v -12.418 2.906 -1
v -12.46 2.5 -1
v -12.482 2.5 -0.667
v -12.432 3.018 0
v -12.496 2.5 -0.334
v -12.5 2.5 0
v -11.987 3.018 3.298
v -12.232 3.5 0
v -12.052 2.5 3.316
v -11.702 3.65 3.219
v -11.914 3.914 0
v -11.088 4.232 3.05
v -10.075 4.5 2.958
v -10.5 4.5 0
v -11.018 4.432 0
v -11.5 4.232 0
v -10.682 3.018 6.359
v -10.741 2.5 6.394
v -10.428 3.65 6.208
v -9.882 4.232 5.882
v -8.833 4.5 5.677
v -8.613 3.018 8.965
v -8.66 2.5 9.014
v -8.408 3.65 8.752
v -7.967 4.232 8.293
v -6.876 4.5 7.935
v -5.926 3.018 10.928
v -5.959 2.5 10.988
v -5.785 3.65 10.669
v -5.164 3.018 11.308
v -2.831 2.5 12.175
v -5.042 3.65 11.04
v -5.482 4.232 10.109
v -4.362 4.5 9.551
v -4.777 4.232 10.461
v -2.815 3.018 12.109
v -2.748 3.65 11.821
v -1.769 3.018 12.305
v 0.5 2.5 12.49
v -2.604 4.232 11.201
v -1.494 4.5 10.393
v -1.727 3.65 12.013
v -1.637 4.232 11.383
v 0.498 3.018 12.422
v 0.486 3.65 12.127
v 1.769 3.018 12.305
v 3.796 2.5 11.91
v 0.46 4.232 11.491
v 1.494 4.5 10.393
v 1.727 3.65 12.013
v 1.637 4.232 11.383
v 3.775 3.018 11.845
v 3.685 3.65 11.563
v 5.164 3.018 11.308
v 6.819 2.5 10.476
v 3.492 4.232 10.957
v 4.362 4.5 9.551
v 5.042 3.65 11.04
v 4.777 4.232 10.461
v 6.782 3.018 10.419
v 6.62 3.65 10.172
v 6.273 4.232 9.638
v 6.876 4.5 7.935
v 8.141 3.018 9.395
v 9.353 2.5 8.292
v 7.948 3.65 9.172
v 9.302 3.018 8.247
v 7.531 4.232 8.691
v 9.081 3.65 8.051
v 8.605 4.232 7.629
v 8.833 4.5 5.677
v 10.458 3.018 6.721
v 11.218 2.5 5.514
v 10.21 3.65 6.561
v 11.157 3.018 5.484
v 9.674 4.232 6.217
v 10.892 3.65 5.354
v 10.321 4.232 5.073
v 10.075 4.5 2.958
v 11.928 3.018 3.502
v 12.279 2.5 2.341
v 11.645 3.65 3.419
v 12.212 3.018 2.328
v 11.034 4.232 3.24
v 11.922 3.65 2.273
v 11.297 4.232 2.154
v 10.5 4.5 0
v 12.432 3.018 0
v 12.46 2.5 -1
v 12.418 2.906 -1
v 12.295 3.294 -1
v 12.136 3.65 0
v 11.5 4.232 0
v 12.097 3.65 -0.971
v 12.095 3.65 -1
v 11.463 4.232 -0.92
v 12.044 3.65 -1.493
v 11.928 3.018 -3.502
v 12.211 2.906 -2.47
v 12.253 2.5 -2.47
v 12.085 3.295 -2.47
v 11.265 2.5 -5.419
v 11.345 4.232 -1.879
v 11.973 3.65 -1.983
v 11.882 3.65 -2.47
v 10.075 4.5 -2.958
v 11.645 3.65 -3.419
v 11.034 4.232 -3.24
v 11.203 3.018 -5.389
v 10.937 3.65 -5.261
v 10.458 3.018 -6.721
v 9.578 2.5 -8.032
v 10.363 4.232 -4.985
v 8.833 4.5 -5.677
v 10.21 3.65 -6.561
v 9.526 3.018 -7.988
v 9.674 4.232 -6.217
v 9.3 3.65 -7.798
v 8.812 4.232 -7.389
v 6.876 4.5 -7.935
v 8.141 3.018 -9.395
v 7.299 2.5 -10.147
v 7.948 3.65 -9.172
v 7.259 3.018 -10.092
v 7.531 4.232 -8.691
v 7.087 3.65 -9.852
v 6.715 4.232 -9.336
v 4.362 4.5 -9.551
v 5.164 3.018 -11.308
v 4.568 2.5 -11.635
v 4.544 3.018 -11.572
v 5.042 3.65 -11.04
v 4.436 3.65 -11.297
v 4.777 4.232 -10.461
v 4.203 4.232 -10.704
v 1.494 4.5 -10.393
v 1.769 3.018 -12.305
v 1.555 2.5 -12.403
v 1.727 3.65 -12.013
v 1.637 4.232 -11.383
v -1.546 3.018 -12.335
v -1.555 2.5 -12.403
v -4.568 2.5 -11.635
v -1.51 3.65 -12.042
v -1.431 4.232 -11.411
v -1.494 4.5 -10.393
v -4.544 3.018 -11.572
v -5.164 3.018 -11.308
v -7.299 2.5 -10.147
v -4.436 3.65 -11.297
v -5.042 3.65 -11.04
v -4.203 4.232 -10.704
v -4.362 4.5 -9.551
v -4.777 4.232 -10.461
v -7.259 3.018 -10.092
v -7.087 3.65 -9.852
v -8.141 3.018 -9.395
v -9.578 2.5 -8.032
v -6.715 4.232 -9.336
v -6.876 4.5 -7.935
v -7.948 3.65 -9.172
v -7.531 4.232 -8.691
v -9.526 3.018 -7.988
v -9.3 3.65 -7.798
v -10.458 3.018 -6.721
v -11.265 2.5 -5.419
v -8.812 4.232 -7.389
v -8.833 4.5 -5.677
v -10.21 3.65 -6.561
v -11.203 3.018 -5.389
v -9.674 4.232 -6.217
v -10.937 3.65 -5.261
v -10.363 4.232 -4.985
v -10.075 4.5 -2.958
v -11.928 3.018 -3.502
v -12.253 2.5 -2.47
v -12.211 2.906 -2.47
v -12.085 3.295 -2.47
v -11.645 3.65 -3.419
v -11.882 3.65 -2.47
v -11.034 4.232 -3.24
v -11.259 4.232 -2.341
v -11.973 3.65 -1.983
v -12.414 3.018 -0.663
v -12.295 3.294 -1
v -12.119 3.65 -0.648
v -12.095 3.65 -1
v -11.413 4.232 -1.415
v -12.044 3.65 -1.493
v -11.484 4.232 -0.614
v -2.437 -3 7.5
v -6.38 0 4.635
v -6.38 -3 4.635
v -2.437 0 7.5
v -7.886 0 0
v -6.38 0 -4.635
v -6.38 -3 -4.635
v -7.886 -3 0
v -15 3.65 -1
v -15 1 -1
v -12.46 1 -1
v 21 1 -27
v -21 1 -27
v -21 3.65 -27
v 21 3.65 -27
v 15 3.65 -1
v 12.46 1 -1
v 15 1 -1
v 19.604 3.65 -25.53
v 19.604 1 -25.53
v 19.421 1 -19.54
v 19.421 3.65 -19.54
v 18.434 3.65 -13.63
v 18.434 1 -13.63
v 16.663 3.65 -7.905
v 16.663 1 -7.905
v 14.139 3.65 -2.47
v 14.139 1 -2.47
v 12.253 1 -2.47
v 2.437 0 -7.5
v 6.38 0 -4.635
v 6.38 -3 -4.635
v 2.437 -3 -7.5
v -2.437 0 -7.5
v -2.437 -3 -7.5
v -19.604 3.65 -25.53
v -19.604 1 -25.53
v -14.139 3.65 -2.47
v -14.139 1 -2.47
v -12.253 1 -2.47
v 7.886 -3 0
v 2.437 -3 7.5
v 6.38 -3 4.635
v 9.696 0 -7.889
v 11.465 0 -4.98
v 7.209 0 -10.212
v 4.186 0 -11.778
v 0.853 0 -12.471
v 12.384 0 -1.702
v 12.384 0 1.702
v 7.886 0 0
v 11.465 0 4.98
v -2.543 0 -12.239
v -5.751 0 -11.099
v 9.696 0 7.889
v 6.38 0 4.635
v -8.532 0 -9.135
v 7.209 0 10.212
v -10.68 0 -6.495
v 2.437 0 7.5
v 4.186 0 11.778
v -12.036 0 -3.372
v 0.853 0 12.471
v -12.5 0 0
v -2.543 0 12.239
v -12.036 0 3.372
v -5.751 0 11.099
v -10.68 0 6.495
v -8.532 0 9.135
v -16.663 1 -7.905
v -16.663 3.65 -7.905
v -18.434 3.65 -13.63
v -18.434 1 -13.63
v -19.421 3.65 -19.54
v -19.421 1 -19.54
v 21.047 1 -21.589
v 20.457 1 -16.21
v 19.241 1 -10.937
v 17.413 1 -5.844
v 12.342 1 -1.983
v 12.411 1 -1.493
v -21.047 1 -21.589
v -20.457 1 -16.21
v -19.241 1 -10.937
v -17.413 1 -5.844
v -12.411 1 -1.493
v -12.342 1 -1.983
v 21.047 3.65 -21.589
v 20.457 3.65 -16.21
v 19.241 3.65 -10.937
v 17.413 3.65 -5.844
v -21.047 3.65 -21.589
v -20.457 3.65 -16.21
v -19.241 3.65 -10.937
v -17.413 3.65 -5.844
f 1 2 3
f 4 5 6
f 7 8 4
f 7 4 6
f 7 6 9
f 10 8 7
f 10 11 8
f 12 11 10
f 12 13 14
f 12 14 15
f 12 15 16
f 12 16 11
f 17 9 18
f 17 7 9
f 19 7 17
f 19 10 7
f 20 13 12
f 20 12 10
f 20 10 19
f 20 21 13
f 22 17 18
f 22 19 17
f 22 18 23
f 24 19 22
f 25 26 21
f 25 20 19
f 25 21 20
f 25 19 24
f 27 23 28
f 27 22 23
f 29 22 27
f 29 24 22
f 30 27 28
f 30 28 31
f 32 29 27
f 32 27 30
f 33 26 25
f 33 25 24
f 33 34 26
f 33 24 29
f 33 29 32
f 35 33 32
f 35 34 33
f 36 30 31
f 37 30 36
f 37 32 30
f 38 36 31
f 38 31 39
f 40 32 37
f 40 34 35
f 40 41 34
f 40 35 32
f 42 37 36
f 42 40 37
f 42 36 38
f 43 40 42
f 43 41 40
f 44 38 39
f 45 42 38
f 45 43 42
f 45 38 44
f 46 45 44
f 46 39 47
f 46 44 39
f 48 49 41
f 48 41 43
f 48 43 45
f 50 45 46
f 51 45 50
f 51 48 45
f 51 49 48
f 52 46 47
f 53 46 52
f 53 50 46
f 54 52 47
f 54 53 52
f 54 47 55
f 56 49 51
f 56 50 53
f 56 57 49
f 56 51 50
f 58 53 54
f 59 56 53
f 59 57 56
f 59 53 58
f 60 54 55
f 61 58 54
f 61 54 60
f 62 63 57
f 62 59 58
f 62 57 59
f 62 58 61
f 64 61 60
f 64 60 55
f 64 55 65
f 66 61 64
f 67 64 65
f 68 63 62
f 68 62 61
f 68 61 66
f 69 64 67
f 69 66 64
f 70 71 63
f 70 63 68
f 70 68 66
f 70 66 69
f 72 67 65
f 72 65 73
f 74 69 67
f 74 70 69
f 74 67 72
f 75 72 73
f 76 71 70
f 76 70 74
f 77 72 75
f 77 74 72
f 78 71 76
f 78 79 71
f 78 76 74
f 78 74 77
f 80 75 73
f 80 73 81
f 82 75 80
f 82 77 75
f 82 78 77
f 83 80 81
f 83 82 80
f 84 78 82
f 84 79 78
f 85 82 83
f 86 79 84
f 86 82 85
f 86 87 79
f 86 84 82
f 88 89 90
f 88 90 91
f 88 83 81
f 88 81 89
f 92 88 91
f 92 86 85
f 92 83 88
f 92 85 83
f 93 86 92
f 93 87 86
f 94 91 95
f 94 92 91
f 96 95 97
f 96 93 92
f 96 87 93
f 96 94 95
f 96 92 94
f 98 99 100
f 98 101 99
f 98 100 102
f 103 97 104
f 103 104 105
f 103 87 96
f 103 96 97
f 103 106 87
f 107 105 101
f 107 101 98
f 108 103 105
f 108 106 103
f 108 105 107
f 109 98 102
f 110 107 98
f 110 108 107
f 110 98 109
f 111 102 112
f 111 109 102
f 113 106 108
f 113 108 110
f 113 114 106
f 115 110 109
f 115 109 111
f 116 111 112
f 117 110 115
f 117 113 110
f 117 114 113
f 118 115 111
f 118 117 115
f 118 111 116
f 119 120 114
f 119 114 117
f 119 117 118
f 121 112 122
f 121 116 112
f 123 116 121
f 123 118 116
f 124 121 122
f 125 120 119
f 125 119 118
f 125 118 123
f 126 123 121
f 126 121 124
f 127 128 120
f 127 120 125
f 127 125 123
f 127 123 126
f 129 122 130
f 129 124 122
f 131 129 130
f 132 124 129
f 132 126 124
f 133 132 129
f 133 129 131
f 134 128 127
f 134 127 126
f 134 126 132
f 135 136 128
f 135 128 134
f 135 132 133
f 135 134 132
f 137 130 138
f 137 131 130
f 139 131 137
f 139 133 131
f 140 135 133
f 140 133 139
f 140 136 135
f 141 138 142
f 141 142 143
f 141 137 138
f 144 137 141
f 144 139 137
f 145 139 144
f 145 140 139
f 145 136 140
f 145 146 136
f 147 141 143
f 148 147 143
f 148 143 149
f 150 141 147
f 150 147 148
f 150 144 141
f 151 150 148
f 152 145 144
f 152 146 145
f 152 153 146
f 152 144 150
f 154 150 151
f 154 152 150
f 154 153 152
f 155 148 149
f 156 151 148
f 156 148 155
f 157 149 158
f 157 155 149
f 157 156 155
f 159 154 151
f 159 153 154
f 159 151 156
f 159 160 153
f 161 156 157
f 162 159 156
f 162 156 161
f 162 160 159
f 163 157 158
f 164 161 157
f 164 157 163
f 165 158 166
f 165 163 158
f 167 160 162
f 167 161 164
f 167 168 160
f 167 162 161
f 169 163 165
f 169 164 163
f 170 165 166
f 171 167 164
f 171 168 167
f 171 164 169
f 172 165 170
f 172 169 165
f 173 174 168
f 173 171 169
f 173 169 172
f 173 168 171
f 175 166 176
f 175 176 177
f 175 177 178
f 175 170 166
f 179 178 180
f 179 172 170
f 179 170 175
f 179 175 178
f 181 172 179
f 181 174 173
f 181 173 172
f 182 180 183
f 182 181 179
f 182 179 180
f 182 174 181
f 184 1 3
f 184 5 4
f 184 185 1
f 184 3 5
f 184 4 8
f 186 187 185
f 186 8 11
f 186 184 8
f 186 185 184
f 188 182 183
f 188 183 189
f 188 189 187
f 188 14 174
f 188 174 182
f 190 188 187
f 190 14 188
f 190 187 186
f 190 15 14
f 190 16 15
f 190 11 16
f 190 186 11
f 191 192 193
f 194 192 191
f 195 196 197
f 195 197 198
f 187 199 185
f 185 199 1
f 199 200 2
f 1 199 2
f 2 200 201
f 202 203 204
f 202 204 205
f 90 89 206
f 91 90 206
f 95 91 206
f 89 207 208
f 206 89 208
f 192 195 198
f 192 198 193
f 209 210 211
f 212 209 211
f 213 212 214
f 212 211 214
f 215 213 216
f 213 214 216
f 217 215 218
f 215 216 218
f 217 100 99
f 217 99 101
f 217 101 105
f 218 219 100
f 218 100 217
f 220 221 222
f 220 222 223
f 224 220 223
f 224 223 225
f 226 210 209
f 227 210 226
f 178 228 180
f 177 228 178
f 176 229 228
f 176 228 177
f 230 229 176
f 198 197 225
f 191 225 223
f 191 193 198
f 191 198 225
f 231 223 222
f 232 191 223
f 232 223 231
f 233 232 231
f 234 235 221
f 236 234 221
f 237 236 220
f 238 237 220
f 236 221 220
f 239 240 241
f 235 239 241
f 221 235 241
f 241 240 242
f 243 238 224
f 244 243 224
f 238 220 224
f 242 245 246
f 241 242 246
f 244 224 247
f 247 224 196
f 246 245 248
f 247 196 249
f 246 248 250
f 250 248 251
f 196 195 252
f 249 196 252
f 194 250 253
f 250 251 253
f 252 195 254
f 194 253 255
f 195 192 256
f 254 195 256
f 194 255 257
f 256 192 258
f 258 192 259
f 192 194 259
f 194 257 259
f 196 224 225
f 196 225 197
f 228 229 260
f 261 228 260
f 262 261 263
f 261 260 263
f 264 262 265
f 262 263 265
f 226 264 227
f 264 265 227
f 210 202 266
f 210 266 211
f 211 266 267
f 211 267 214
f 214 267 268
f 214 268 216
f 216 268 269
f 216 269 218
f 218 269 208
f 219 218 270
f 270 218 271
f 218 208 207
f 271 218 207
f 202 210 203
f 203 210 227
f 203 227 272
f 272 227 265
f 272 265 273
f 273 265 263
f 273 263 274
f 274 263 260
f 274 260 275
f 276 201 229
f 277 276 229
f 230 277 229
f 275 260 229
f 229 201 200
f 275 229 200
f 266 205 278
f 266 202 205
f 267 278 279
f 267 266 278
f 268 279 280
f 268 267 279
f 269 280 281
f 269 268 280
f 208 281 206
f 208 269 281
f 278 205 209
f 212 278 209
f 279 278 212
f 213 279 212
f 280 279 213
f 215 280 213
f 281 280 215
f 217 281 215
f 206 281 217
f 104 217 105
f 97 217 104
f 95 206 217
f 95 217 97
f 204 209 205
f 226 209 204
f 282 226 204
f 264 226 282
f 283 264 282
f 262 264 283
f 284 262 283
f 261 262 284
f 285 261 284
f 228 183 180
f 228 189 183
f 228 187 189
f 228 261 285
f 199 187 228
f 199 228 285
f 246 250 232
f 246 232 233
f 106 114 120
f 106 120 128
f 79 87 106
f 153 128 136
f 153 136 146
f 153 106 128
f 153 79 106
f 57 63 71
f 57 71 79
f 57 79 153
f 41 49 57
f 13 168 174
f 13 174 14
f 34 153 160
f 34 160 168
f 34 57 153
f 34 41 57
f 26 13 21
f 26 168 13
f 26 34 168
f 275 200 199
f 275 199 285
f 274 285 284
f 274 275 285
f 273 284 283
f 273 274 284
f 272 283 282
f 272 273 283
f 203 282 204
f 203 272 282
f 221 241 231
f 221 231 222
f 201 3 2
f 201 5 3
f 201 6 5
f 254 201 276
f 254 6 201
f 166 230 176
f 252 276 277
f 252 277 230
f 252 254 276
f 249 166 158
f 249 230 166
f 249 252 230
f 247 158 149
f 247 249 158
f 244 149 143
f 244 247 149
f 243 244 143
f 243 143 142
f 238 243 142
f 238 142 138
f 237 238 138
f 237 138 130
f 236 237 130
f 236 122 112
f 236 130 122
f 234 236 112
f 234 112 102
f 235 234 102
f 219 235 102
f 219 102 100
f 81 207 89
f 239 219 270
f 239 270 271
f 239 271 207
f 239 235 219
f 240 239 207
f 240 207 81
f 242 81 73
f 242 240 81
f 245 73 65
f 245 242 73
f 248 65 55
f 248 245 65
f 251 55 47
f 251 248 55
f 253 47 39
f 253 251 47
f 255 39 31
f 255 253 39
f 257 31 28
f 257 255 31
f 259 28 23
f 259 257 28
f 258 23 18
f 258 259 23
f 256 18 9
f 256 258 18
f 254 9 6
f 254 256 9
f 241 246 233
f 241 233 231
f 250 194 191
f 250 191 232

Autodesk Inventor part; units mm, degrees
ref_plane "YZ Plane" through (0, 0, 0) normal (1, 0, 0) x (0, 1, 0)
ref_plane "XY Plane" through (0, 0, 0) normal (0, 0, 1) x (1, 0, 0)
sketch "Sketch1" plane through (0, 0, 0) normal (0, 1, 0) x (-1, 0, 0)
  circle A0 centre (0, 0) radius 12.5
  dimension "d0" = 25
extrude "Extrusion1" add sketch "Sketch1" along normal blind 4.5
ref_plane "Work Plane1" through (0, 1, 0) normal (0, 1, 0) x (-1, 0, 0)
sketch "Sketch2" plane through (0, 1, 0) normal (0, 1, 0) x (-1, 0, 0)
  line L0 (15, -1) -> (-15, -1)
  arc A0 (21, -27) -> (15, -1) centre (-24.8954, -23.8989) ccw
  line L1 (21, -27) -> (-21, -27)
  arc A1 (-15, -1) -> (-21, -27) centre (24.8954, -23.8989) ccw
  line L2 (-19.6045, -25.5298) -> (19.6045, -25.5298)
  arc A2 (19.6045, -25.5298) -> (14.1394, -2.4702) centre (-24.8954, -23.8989) ccw
  line L3 (14.1394, -2.4702) -> (-14.1394, -2.4702)
  arc A3 (-14.1394, -2.4702) -> (-19.6045, -25.5298) centre (24.8954, -23.8989) ccw
  point P0 (0, -1)
  point P1 (0, -27)
  dimension "d5" = 30
  dimension "d6" = 26
  dimension "d7" = 42
  dimension "d8" = 46
  dimension "d9" = 46
extrude "Extrusion2" add sketch "Sketch2" along normal blind 2.65
fillet "Fillet1" radius 2 1 edges at (12.5, 4.5, 0)
sketch "Sketch3" plane through (0, 0, 0) normal (0, -1, 0) x (1, 0, 0)
  line L0 (-7.886, 0) -> (-6.3799, 4.6353)
  line L1 (-6.3799, 4.6353) -> (-2.4369, 7.5)
  line L2 (-2.4369, 7.5) -> (2.4369, 7.5)
  line L3 (2.4369, 7.5) -> (6.3799, 4.6353)
  line L4 (6.3799, 4.6353) -> (7.886, 0)
  line L5 (7.886, 0) -> (6.3799, -4.6353)
  line L6 (6.3799, -4.6353) -> (2.4369, -7.5)
  line L7 (2.4369, -7.5) -> (-2.4369, -7.5)
  line L8 (-2.4369, -7.5) -> (-6.3799, -4.6353)
  line L9 (-6.3799, -4.6353) -> (-7.886, 0)
  point P0 (0, 0)
  point P1 (0, 0)
  point P2 (0, -7.5)
  dimension "d13" = 15
extrude "Extrusion3" add sketch "Sketch3" along normal blind 3
properties part number "brace_tabs_half"
